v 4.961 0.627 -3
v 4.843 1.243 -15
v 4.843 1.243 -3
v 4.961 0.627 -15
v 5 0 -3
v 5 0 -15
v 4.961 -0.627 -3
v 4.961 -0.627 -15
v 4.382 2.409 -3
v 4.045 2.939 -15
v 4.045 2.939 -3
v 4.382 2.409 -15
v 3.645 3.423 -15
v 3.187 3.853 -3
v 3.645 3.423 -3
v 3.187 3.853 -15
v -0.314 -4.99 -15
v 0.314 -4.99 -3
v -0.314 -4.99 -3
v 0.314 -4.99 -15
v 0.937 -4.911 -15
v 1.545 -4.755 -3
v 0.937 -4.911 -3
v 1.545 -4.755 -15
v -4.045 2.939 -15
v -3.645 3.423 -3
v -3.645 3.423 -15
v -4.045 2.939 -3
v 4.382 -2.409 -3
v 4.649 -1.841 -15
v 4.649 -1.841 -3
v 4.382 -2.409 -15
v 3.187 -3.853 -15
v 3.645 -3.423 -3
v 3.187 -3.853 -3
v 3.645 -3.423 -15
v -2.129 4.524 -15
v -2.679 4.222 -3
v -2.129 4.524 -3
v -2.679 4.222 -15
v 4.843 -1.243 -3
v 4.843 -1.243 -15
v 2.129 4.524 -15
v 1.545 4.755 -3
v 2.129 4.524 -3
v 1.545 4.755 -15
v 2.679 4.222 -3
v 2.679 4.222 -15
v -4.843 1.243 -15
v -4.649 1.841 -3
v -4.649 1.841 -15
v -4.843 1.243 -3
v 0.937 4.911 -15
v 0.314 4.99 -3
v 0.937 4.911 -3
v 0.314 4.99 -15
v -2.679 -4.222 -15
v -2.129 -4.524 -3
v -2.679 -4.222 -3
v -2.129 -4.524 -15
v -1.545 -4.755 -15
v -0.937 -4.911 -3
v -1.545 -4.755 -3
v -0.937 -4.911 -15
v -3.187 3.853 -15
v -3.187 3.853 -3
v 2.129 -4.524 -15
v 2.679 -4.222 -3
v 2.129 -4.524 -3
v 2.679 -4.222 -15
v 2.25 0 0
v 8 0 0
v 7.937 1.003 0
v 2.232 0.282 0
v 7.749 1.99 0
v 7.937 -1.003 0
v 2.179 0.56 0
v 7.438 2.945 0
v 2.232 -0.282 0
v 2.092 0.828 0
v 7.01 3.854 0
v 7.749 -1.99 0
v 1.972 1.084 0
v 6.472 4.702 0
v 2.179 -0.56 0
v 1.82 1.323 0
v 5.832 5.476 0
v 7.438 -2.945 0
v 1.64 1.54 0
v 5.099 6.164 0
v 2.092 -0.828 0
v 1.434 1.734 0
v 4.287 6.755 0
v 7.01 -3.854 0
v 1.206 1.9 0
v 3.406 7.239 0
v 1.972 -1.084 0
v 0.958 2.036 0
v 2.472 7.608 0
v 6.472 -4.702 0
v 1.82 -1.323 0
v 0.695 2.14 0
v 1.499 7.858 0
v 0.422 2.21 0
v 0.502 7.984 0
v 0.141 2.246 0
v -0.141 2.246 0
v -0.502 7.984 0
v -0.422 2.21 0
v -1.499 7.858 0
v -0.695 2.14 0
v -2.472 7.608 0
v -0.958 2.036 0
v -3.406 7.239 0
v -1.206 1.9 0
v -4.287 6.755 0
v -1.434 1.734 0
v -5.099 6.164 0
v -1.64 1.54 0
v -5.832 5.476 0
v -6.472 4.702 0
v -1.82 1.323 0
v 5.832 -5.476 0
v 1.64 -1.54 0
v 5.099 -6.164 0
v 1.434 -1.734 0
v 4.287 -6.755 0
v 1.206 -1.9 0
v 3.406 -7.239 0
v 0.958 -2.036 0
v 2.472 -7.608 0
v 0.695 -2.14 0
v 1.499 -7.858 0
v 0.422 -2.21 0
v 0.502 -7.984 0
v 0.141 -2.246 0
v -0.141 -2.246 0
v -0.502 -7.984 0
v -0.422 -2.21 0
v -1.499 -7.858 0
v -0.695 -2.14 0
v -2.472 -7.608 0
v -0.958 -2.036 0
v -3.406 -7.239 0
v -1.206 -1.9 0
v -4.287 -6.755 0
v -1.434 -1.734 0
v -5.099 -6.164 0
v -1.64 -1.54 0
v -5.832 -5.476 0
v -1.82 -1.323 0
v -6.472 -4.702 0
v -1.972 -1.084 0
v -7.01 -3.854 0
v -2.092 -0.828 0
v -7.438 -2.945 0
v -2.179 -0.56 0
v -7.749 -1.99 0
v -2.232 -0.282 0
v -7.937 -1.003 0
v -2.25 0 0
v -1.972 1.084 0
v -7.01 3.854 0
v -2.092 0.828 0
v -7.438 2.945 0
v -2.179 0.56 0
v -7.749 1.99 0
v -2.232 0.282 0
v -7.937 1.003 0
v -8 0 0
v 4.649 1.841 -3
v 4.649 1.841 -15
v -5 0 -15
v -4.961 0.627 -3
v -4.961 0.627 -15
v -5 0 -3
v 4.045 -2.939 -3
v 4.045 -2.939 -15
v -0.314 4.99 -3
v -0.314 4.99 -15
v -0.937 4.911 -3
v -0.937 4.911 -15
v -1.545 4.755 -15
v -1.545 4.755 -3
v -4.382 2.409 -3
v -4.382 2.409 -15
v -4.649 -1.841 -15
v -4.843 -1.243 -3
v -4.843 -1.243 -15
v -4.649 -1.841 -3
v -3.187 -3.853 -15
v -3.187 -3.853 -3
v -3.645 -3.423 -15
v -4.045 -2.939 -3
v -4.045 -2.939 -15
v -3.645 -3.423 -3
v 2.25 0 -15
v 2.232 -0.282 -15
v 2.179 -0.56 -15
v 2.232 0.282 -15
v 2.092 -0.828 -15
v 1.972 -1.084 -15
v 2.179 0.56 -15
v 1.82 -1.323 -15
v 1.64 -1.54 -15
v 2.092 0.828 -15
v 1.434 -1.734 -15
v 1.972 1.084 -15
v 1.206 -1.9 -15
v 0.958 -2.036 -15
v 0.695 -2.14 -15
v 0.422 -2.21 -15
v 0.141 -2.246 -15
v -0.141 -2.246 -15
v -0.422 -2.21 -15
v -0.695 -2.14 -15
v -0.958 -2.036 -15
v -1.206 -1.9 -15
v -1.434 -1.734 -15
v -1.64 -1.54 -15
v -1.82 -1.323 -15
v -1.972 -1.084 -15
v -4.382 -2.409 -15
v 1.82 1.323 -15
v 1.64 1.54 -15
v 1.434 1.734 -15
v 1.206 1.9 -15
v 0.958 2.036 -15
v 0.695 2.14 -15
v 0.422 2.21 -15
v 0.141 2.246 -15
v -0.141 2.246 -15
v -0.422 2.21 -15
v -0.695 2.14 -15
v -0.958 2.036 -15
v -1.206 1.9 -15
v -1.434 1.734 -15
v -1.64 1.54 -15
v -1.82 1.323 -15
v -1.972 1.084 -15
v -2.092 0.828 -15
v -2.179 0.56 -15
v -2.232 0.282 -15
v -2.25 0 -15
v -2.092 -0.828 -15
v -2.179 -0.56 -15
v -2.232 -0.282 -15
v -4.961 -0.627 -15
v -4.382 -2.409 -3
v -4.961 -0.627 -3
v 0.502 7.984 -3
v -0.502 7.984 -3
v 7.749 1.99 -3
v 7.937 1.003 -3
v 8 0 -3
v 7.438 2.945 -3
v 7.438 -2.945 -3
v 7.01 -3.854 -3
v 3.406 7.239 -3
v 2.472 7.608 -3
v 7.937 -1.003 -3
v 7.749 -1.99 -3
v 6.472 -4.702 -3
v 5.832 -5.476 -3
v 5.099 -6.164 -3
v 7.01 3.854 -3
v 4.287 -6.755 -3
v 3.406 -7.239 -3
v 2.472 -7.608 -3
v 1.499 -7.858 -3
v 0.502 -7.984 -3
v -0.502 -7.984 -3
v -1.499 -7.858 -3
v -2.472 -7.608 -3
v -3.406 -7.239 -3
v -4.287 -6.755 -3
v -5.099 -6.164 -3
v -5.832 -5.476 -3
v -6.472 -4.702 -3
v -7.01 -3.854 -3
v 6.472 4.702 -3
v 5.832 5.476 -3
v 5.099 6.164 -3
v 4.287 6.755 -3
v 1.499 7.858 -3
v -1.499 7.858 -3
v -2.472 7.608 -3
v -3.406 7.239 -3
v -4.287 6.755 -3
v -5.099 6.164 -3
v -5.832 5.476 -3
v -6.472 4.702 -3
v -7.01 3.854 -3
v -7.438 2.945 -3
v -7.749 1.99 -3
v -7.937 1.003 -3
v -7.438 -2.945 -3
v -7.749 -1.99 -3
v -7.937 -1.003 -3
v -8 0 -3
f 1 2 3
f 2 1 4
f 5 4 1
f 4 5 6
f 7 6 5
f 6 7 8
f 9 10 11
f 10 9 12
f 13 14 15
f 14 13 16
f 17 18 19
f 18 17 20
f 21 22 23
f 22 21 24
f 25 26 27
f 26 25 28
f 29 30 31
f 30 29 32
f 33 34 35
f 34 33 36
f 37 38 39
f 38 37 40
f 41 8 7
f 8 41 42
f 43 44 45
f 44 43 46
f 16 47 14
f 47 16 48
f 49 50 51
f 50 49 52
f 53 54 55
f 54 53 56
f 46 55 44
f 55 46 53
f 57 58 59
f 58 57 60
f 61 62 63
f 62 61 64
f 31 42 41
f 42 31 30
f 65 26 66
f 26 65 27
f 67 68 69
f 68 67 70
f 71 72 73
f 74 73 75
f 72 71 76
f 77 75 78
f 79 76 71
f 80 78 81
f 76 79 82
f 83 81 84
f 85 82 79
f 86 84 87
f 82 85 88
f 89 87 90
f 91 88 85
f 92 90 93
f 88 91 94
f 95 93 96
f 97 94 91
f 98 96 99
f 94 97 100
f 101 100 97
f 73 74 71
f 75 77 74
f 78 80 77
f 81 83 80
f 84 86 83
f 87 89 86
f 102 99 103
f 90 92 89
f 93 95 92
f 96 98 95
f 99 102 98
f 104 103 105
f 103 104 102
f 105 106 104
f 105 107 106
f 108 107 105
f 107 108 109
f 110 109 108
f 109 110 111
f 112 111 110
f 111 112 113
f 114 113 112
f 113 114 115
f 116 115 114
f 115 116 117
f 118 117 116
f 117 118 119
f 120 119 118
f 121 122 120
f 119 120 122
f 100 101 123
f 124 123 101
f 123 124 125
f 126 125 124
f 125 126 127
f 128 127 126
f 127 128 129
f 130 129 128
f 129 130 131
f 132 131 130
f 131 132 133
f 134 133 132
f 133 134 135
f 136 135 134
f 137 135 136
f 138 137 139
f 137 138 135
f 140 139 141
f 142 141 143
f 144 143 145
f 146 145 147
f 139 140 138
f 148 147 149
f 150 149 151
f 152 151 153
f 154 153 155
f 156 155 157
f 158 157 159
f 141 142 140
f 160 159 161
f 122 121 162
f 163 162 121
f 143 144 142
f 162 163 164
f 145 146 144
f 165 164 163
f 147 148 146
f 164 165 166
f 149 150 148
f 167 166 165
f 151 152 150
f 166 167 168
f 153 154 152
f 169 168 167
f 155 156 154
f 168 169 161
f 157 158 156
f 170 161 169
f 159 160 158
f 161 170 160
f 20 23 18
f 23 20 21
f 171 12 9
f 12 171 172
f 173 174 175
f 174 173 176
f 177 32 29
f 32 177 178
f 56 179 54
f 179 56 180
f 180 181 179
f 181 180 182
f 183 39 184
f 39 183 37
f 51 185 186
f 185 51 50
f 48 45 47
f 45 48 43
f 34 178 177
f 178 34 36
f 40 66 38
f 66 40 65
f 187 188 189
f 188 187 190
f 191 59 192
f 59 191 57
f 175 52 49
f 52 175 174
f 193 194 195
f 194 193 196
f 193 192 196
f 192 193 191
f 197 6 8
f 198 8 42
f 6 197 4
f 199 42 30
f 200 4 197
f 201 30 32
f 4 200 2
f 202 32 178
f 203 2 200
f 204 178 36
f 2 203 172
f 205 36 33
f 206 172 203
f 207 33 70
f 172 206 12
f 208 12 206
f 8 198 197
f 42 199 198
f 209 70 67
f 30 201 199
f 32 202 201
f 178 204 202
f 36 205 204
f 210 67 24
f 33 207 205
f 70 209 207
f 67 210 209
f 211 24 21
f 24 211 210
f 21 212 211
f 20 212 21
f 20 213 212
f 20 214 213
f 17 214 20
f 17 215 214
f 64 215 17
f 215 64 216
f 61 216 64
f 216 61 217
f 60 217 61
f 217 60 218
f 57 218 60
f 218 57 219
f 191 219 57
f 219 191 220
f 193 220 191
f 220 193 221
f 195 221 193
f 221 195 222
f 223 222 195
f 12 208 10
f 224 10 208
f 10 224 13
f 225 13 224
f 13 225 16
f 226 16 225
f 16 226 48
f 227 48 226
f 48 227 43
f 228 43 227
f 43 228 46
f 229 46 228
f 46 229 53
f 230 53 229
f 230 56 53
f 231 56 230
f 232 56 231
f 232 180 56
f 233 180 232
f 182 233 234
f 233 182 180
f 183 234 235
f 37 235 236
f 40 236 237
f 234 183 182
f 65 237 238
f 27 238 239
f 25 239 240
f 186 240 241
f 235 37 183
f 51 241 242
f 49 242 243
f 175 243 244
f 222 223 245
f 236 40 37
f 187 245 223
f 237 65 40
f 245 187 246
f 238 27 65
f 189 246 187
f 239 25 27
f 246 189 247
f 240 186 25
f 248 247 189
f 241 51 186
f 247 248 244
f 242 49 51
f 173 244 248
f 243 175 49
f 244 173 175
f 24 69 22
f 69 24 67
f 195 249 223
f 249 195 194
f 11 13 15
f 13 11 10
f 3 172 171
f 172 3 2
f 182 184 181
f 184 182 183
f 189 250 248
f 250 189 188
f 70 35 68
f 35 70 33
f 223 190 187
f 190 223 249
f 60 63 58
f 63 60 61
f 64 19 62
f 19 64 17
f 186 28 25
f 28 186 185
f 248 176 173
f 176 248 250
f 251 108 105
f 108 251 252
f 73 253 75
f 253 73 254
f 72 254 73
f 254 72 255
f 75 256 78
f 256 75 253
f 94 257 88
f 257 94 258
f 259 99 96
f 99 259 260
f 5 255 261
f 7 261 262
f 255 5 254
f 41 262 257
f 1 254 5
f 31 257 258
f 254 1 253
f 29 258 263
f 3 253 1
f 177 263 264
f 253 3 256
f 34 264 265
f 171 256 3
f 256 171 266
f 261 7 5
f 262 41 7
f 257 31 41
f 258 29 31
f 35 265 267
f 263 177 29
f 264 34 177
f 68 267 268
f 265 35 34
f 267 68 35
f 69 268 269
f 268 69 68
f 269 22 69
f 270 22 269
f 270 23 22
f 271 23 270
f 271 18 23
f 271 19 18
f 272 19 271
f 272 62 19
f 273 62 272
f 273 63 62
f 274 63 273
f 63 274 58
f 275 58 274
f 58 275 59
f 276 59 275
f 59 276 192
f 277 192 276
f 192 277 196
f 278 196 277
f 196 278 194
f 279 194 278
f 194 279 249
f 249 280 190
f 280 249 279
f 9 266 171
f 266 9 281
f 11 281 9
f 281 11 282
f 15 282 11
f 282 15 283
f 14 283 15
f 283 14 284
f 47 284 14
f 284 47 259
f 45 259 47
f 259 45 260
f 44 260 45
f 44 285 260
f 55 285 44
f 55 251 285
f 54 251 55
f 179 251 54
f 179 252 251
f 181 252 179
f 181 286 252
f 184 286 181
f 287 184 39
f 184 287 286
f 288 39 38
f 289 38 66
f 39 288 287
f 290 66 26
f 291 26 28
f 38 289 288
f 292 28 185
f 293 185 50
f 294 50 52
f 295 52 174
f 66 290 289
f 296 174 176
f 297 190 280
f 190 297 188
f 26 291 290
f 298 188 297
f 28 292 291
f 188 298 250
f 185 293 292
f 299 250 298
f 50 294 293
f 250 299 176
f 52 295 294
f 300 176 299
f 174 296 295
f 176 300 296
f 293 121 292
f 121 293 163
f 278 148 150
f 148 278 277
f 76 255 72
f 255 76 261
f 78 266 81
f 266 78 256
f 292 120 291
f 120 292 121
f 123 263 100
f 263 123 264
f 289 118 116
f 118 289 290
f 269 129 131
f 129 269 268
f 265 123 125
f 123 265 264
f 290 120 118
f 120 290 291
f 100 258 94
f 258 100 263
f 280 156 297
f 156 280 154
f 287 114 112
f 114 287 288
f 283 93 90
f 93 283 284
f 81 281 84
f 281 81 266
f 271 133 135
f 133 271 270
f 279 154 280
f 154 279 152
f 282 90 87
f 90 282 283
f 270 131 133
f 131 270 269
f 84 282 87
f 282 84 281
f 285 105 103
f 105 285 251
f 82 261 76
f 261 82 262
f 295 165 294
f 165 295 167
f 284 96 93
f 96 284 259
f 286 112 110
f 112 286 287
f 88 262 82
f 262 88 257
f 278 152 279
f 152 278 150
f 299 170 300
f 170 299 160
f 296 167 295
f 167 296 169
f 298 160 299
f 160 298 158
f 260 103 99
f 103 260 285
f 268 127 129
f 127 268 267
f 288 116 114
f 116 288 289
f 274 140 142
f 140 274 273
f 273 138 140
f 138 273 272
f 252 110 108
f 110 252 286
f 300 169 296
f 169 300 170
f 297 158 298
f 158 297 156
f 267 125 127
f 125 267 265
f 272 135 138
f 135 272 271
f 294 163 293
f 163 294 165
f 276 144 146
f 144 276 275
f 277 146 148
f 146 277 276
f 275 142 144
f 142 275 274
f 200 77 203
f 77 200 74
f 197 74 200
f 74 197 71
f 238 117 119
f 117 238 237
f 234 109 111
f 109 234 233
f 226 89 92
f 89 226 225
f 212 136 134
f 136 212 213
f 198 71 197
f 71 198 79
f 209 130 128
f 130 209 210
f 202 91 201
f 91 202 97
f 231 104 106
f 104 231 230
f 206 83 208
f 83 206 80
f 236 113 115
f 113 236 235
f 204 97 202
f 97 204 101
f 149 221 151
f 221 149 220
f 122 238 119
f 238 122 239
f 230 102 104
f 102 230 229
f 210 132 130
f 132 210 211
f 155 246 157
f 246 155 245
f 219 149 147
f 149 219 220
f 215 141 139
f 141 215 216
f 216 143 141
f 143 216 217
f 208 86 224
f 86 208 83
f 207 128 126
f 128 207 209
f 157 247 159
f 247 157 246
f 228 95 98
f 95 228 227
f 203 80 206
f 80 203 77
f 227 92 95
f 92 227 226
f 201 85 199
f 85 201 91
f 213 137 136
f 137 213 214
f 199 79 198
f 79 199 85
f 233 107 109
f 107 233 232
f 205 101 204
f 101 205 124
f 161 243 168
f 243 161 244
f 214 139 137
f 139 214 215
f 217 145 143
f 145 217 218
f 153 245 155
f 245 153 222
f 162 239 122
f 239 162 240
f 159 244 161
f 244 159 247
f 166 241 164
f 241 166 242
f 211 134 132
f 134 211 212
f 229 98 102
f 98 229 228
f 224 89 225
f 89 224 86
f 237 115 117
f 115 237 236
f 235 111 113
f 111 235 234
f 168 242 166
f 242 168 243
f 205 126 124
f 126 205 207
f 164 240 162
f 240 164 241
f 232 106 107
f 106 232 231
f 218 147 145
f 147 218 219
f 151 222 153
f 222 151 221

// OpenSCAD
$fn = 50;


difference() {
	union() {
		translate(v = [0, 0, -15.0000000000]) {
			cylinder(h = 15, r = 5.0000000000);
		}
		translate(v = [0, 0, -3.0000000000]) {
			cylinder(h = 3, r = 8.0000000000);
		}
	}
	union() {
		#translate(v = [0, 0, -15]) {
			cylinder(h = 15, r = 2.2500000000);
		}
	}
}
